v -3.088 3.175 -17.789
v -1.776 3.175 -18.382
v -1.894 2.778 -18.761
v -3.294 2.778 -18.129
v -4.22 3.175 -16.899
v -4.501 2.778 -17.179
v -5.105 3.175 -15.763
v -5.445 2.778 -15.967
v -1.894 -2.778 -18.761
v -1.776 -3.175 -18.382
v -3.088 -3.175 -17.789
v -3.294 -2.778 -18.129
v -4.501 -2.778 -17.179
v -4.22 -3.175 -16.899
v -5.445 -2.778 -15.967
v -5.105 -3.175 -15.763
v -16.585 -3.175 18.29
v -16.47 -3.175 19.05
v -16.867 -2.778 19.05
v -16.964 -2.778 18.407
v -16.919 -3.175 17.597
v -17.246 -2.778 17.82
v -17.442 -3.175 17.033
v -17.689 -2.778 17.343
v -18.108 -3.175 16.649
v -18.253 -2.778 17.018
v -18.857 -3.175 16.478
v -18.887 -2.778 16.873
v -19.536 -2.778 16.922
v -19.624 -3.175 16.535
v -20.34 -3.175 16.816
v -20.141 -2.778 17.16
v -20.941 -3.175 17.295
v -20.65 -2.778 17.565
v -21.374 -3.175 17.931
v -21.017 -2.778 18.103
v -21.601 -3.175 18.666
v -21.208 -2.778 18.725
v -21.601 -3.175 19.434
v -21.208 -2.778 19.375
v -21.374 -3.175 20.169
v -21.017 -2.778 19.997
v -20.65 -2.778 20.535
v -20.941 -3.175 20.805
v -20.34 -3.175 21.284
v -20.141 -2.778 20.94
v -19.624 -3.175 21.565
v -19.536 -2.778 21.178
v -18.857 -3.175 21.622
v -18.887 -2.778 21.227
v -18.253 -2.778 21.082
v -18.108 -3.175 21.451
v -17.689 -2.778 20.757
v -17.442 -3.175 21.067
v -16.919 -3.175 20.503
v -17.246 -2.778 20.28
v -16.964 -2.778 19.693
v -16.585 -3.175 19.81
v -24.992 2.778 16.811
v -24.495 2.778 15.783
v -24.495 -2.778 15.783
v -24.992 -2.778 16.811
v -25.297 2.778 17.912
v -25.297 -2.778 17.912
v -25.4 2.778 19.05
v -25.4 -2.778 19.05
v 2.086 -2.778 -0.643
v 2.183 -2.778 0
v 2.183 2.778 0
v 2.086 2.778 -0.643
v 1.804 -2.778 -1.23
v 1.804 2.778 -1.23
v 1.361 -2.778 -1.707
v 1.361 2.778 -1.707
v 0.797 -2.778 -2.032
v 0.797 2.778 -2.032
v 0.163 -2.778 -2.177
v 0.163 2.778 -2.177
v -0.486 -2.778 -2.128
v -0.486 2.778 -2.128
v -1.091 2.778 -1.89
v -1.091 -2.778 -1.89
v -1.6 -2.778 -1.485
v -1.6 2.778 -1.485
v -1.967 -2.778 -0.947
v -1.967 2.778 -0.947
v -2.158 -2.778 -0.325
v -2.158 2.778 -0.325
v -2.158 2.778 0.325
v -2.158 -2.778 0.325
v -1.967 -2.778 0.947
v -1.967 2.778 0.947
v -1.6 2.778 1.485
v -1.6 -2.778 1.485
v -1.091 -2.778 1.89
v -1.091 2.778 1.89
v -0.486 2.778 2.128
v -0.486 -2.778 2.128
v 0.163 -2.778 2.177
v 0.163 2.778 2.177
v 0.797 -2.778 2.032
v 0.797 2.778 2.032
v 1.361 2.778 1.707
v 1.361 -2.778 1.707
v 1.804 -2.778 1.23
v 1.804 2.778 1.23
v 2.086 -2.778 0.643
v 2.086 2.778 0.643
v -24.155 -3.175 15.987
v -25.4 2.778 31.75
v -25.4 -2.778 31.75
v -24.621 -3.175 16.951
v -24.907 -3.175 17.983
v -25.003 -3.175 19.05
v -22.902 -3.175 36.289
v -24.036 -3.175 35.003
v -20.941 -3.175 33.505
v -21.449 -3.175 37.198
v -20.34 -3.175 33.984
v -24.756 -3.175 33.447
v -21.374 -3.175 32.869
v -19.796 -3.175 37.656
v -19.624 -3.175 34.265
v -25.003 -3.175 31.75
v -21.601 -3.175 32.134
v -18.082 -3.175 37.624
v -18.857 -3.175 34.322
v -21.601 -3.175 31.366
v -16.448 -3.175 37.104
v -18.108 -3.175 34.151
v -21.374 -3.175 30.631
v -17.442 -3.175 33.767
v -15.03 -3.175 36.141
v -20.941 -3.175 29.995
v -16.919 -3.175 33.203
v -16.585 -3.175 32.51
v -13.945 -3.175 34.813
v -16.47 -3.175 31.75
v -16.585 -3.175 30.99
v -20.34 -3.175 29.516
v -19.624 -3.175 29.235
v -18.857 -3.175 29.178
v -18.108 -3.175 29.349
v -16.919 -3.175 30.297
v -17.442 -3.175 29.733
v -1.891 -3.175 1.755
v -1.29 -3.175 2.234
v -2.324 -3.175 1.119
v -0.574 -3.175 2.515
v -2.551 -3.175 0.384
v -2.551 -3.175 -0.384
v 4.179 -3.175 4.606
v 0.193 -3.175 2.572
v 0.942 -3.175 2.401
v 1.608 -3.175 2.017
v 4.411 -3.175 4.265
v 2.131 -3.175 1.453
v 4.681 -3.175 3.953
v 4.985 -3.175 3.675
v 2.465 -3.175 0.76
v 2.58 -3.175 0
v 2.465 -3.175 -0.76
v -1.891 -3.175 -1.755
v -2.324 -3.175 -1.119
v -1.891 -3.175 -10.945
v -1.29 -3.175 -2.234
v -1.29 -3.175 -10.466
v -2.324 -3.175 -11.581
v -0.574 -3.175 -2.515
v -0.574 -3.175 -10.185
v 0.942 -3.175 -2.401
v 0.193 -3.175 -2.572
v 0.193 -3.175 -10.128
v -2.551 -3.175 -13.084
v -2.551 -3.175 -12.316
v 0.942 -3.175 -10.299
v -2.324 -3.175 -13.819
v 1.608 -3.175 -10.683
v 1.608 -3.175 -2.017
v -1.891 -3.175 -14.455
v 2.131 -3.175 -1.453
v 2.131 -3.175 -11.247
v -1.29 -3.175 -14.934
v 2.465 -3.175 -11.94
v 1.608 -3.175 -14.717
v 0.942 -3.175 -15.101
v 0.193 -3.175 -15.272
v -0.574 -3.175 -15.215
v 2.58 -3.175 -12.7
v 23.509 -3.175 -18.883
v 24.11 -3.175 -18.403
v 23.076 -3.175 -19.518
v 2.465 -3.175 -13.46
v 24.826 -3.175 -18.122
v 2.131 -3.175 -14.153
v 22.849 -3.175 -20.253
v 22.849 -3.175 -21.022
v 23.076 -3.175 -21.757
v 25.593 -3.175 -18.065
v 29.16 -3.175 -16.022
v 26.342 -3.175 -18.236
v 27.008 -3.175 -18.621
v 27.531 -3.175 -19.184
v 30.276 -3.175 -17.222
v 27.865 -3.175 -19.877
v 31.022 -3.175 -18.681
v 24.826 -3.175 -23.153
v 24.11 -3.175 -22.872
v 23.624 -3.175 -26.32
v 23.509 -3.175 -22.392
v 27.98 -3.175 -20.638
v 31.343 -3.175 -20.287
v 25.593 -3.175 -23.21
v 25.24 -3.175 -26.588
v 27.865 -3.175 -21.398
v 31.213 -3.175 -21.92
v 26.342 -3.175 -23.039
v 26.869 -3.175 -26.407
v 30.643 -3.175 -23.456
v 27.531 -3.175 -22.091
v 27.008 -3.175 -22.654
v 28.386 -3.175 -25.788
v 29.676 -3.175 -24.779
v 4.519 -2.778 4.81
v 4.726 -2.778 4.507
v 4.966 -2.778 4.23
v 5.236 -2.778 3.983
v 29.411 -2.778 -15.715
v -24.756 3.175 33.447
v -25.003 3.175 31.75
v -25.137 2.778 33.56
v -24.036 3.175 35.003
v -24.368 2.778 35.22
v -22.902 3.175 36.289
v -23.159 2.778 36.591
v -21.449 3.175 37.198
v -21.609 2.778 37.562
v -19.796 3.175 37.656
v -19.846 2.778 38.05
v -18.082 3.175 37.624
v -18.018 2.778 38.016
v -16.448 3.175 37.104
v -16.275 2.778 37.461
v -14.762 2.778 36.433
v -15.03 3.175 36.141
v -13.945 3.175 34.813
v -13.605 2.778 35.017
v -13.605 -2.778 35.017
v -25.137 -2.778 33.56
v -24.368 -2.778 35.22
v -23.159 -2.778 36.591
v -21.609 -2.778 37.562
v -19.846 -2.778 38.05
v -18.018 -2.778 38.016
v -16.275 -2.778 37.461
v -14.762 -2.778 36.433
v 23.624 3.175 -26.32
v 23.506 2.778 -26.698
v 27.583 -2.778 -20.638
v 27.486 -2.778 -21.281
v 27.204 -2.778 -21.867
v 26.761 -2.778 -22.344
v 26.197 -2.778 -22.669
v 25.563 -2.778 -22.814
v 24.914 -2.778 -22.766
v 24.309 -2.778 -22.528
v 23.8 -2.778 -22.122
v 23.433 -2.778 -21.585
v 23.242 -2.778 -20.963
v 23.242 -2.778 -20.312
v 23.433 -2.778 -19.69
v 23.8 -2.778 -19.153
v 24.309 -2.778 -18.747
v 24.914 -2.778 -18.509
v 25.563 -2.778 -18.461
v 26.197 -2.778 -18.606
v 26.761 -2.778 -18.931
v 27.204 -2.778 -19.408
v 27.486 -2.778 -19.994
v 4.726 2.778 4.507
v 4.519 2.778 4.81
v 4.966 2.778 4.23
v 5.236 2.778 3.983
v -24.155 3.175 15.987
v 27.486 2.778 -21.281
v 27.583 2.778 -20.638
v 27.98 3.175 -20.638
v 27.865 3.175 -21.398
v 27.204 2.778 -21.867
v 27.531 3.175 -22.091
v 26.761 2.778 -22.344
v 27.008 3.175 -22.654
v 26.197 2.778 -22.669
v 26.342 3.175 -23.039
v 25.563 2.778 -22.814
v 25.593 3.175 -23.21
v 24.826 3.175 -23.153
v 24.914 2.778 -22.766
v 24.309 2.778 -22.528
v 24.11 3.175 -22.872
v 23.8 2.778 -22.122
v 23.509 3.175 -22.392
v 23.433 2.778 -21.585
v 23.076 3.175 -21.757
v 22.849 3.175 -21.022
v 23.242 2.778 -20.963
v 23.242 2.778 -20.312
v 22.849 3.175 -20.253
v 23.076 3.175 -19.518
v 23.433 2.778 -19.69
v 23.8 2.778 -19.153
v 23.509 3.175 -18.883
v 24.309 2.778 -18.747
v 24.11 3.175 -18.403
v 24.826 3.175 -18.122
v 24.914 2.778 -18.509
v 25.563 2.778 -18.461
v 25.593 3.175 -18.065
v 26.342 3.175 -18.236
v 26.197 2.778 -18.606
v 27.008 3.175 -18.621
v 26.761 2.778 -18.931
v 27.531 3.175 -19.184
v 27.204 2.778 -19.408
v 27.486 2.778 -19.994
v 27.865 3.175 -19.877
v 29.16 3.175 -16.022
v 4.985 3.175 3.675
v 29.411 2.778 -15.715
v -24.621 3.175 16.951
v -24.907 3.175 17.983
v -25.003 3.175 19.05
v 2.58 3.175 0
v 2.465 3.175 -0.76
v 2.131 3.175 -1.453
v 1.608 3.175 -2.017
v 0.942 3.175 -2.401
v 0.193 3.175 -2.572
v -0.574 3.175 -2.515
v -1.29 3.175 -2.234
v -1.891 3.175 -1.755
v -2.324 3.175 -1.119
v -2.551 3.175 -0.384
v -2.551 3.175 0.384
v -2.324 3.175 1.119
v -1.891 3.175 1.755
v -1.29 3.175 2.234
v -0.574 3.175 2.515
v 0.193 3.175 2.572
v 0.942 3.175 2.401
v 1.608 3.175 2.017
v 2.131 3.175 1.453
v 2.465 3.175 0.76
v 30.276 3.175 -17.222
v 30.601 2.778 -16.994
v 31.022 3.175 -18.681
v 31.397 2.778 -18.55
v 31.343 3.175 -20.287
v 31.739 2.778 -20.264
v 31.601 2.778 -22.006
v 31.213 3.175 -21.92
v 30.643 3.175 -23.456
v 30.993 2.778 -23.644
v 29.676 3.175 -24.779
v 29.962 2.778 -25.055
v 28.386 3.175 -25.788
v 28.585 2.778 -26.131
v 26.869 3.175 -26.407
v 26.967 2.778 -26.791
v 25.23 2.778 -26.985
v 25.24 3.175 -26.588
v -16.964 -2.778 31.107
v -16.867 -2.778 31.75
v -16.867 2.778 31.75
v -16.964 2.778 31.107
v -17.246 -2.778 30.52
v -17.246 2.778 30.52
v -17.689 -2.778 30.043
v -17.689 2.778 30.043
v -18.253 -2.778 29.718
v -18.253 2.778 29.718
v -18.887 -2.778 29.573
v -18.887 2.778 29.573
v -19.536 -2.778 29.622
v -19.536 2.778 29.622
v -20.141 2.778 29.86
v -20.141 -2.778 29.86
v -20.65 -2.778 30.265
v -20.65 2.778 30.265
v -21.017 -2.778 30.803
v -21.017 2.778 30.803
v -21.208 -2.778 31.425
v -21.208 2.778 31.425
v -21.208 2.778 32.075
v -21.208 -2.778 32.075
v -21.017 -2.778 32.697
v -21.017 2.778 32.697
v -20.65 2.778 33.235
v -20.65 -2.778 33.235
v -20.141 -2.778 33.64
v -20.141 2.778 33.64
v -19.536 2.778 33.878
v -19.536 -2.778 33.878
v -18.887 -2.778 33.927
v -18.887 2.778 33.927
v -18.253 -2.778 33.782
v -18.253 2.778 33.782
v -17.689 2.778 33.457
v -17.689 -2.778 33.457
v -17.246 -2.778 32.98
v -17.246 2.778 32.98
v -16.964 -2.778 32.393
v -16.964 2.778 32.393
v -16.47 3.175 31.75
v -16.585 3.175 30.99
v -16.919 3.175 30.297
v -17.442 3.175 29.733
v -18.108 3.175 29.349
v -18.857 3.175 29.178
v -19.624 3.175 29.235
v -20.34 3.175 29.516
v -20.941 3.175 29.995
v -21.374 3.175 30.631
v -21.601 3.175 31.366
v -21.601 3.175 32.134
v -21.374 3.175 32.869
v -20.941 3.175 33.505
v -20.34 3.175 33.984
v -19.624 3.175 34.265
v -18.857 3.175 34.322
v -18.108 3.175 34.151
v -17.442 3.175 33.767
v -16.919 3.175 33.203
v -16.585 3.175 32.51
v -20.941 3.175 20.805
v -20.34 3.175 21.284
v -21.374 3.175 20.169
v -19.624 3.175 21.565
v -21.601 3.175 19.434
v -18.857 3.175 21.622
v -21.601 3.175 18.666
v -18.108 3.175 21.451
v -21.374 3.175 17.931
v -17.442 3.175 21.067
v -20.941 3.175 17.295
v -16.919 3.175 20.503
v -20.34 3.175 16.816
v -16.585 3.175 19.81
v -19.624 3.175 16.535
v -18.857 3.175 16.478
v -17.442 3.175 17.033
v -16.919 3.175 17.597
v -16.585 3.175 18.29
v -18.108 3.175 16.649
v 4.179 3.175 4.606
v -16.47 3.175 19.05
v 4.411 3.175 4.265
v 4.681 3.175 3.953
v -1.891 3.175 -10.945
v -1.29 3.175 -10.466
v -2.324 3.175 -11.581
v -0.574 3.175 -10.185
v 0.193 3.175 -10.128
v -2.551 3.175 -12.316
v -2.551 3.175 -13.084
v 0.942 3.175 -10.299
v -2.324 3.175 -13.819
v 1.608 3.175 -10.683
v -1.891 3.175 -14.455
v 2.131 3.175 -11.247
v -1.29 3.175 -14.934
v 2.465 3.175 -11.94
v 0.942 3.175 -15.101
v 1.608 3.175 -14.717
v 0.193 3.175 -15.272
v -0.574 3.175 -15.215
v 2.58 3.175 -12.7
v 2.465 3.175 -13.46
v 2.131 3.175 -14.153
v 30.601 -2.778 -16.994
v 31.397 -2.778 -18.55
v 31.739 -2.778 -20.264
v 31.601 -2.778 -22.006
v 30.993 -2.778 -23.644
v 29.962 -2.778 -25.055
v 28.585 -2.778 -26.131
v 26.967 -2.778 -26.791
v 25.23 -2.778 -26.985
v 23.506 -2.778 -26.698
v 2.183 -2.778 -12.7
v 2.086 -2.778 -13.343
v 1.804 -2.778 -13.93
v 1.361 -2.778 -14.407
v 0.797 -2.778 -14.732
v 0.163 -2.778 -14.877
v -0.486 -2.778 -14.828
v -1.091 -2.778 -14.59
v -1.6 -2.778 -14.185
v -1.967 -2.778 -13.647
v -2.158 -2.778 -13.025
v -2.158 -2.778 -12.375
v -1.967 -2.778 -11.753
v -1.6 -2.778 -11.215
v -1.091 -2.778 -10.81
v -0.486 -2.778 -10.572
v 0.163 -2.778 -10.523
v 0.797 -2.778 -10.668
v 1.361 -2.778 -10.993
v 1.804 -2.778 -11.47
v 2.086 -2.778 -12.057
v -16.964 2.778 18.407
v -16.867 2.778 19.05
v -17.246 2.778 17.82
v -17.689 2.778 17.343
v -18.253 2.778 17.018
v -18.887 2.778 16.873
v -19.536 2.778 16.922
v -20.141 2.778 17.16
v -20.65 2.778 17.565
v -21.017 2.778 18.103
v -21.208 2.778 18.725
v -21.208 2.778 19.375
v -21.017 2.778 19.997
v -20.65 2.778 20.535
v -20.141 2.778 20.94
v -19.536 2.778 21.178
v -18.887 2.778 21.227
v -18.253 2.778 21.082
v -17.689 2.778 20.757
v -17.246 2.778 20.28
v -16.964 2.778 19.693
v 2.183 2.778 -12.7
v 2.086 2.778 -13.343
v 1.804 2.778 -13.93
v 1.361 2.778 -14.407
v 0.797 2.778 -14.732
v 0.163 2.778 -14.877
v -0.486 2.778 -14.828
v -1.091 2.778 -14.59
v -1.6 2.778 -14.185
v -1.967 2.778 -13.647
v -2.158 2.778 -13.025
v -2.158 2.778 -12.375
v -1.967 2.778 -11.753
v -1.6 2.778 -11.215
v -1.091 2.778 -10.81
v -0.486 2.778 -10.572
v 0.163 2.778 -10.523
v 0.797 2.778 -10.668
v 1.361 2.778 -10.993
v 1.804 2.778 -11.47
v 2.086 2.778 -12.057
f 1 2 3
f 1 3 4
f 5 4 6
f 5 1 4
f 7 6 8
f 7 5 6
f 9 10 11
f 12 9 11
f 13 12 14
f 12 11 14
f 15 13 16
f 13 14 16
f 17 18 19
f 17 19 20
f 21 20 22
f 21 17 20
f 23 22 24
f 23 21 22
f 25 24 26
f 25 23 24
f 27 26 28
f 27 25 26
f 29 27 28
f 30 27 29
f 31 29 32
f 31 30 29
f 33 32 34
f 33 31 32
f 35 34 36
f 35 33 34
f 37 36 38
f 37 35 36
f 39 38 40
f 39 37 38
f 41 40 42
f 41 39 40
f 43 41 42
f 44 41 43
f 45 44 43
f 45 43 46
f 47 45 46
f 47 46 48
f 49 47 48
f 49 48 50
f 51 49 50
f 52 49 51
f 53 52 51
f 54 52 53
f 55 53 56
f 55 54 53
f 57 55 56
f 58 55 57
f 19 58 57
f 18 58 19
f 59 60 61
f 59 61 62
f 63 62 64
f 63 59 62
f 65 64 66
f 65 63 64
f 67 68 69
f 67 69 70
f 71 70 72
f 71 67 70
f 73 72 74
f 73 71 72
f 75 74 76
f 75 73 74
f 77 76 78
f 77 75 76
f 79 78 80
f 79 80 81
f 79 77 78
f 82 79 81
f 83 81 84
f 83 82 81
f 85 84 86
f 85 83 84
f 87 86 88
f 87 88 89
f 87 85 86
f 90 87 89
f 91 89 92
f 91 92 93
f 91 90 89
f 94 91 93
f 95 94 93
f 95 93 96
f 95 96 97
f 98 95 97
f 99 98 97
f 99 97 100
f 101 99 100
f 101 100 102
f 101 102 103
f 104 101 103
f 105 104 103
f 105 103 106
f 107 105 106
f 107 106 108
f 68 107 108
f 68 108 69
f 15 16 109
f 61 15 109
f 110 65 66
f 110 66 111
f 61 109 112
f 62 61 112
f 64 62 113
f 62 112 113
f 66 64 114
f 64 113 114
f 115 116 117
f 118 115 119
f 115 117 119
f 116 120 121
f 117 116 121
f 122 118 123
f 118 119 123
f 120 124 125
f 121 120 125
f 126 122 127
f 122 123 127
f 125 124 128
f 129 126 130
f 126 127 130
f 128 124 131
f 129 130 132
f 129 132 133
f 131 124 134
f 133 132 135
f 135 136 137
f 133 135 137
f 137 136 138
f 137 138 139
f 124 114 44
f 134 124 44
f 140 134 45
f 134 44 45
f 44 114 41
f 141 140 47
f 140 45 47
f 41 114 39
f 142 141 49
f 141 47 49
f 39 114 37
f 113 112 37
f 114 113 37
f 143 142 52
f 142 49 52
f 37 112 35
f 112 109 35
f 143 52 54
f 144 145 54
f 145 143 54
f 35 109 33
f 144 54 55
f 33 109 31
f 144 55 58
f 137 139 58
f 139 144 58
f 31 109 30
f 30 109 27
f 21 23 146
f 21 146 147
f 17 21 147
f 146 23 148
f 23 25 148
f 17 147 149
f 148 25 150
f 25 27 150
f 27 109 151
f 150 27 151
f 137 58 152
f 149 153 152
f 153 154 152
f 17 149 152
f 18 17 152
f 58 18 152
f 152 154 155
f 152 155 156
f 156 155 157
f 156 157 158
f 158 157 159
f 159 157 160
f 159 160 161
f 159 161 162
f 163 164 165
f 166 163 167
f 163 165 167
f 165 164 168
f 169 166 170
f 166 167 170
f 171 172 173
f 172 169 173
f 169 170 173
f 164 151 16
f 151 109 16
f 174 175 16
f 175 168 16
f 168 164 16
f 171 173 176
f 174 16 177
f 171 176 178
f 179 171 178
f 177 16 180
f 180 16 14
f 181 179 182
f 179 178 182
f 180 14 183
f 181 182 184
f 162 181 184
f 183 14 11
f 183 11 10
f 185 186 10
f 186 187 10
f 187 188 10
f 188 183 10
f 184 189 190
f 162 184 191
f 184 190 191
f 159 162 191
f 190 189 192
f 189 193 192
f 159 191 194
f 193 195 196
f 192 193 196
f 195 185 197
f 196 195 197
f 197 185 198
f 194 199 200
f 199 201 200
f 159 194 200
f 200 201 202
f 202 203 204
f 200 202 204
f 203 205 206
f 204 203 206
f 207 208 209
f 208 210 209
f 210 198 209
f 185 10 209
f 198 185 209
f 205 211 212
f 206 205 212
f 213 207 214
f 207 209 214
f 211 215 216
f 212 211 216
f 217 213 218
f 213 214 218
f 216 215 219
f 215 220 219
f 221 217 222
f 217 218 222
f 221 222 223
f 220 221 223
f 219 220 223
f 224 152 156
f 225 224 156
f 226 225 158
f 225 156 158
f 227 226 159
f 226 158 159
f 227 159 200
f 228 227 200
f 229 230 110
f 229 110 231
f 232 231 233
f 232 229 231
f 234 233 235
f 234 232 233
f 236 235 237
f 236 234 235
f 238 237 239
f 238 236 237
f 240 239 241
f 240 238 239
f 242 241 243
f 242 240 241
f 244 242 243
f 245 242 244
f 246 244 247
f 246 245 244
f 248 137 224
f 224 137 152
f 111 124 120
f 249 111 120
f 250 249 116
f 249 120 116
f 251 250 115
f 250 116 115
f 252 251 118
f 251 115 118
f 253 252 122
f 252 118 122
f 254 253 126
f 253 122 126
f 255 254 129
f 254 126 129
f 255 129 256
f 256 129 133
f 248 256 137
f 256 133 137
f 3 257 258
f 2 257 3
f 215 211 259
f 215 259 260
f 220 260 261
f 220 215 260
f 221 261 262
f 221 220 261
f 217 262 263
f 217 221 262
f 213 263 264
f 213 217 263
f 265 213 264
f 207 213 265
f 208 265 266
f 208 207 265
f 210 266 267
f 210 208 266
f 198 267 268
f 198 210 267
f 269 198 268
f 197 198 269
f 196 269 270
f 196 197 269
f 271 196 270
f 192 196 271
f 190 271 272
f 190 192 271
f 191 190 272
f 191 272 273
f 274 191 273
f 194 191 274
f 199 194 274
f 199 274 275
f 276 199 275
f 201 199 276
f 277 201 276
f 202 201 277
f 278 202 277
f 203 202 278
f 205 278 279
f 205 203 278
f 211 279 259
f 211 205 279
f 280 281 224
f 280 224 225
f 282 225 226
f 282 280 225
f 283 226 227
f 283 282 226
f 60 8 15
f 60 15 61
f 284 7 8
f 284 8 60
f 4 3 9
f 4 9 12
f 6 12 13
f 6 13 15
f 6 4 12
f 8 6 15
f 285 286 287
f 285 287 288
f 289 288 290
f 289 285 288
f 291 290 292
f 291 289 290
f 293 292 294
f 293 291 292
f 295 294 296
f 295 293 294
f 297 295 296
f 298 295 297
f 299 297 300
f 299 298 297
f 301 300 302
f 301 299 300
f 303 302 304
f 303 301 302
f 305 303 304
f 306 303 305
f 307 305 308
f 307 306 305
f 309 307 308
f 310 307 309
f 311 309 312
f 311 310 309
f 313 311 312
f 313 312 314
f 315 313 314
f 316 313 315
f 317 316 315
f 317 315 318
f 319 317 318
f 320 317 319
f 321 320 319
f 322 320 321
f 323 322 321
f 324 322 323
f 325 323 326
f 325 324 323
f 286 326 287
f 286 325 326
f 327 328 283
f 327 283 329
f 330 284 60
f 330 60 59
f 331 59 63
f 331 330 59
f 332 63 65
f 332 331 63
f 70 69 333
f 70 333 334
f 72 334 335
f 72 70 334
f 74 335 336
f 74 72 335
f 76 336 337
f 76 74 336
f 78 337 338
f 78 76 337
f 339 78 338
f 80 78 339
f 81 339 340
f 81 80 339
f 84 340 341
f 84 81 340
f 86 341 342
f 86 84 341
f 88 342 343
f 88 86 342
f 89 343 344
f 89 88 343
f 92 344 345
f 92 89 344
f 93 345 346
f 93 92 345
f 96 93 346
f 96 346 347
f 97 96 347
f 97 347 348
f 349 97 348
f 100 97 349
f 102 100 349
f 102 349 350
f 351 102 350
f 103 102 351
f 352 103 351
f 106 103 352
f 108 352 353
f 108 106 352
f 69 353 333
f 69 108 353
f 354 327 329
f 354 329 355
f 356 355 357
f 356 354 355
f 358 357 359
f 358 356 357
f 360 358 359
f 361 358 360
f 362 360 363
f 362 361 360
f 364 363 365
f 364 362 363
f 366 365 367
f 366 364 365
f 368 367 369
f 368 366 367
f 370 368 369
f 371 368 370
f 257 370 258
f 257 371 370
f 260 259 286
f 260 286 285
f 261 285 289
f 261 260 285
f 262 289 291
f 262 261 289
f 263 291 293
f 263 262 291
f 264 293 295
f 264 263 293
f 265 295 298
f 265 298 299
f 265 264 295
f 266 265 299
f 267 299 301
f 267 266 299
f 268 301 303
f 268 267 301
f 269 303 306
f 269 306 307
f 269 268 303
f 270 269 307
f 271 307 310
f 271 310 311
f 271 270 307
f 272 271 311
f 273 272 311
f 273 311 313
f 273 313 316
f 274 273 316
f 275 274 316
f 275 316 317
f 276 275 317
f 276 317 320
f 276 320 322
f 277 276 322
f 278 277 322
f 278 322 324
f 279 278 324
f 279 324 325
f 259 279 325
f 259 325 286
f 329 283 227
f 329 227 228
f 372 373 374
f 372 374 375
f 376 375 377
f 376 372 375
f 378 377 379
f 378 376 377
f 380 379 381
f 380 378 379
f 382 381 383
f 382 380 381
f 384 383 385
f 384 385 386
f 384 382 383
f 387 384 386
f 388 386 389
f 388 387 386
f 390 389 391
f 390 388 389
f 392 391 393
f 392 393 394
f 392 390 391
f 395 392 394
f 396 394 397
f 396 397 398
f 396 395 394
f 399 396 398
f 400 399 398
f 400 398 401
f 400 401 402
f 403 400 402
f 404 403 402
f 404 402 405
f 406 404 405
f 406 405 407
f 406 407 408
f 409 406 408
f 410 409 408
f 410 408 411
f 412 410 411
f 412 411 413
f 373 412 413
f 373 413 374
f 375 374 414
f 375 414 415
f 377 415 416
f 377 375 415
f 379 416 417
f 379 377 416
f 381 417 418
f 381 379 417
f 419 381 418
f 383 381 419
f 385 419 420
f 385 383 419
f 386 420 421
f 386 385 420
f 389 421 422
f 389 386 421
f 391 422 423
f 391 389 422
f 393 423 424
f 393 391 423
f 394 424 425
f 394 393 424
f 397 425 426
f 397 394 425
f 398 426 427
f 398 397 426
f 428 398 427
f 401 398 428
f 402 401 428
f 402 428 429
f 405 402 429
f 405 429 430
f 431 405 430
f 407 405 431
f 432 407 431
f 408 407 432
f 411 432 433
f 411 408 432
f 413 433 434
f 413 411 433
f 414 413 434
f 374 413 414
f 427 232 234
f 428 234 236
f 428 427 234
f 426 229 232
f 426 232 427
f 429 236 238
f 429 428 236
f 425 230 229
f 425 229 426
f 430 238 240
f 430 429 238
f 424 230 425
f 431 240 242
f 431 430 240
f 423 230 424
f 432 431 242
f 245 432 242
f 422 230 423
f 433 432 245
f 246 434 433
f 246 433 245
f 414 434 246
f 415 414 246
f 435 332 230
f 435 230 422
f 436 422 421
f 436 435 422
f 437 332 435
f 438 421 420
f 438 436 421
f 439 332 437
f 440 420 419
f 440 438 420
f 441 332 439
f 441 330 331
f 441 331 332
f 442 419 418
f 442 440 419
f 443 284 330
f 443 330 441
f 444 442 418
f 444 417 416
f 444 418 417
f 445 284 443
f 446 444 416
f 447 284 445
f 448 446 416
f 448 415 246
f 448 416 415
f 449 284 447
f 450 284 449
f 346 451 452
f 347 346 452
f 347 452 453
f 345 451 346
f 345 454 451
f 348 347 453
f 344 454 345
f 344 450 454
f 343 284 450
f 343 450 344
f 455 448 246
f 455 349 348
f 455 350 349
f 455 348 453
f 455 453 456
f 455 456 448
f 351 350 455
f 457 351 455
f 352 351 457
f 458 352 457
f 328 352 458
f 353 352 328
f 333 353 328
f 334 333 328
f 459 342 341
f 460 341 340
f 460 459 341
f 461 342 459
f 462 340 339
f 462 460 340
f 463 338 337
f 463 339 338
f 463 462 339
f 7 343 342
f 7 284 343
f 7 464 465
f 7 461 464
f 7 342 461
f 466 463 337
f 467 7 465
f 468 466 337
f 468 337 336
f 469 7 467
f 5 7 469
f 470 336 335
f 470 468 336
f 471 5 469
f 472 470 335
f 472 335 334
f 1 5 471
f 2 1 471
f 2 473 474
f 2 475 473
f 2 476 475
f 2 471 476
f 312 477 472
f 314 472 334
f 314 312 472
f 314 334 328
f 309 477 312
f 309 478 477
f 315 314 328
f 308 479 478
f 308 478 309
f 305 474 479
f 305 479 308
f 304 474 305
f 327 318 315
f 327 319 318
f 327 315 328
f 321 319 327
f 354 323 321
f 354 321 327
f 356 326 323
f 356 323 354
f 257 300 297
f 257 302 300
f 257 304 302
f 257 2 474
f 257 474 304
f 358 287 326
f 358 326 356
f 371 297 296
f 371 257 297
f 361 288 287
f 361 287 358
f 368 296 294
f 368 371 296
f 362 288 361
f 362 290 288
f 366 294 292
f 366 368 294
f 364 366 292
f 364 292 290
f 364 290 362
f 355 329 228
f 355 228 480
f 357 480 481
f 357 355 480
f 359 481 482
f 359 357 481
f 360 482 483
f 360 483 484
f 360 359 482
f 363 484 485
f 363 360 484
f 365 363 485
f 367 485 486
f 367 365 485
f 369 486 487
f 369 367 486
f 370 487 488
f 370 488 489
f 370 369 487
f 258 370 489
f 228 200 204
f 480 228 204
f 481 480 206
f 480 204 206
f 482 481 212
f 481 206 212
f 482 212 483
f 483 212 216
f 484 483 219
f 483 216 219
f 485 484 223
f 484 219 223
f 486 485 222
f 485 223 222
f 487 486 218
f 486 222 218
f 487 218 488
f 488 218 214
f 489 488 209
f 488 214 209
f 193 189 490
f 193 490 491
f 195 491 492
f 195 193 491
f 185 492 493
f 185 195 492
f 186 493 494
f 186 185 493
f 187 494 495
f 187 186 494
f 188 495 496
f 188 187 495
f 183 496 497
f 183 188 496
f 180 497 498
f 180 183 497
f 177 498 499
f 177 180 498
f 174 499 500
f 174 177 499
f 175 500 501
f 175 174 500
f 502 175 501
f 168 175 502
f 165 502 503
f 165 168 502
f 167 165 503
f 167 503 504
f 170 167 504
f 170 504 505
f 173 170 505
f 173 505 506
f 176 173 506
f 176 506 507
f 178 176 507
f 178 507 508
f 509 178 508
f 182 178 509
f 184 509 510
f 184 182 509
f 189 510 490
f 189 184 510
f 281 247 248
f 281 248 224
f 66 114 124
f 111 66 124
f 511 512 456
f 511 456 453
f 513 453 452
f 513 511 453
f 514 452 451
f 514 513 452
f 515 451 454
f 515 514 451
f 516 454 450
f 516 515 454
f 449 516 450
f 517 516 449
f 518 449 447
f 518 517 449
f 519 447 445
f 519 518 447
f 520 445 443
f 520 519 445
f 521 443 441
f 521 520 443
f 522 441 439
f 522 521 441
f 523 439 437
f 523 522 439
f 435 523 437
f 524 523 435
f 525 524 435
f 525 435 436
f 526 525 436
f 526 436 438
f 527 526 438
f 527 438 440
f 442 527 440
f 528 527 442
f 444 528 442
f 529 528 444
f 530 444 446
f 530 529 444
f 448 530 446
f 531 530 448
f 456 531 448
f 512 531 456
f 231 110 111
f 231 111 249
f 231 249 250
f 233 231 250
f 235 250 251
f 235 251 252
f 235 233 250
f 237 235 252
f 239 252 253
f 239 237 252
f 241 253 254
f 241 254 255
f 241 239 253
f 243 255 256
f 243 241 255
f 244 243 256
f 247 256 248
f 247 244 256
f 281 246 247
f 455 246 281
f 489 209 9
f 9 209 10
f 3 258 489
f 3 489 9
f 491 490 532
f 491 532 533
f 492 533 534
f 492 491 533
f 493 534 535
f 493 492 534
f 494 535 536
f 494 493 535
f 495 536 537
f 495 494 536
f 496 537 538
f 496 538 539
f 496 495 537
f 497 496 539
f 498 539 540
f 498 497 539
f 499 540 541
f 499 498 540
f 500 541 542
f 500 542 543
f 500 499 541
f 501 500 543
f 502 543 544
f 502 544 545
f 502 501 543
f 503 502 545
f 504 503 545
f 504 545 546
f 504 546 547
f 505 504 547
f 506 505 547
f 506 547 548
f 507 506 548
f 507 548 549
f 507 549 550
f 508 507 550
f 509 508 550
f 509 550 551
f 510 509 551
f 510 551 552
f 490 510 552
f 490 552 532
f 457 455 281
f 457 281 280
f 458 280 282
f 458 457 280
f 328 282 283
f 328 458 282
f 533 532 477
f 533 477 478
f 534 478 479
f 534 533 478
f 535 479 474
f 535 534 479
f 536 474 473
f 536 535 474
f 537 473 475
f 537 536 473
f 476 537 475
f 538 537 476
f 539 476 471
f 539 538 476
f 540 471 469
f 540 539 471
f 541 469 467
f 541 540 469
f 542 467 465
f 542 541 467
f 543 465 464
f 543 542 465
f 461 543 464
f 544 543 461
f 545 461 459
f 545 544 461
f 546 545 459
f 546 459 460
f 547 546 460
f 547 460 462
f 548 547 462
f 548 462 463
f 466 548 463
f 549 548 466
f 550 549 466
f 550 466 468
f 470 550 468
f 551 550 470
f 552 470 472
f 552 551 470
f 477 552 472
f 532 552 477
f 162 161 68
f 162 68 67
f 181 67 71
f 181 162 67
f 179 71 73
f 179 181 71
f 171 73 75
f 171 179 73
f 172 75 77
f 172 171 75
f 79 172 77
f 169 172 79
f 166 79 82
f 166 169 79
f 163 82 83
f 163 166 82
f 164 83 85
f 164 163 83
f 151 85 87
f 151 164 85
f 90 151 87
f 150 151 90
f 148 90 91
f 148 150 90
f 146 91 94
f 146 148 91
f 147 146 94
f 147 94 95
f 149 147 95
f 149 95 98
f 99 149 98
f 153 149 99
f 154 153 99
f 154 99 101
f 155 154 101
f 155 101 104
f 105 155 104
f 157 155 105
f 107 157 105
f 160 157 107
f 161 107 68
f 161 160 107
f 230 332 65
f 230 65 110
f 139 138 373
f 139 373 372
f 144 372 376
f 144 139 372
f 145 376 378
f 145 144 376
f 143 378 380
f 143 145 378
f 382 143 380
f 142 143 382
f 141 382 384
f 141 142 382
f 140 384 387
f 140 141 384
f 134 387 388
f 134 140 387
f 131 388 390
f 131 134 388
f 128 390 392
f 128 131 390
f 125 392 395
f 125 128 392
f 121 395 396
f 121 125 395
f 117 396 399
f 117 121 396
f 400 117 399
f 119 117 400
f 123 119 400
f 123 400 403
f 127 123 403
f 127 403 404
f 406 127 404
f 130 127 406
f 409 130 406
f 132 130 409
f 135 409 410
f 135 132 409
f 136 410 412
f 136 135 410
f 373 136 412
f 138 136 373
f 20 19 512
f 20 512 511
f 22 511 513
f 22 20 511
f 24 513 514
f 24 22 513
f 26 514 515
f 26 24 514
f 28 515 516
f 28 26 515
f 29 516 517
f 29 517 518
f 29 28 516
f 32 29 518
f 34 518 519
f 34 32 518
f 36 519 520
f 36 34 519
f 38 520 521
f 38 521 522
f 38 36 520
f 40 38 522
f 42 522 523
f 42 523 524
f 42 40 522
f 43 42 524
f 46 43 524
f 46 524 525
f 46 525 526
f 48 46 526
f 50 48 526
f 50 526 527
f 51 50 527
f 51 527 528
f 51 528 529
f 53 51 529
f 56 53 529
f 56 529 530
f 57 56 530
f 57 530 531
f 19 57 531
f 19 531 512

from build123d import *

# Parameters (mm, degrees)
SKETCH1_R           = 2.1828125
BOSS_EXTRUDE1_DEPTH = 3.175
CHAMFER1_SIZE       = 0.396875


with BuildPart() as part:
    # Sketch1 → Boss-Extrude1 (new body, symmetric)
    with BuildSketch(Plane(origin=(0, 0, 0), x_dir=(1, 0, 0), z_dir=(0, 1, 0))):
        with BuildLine():
            Line((-25.4, -19.05), (-25.4, -31.75))
            ThreePointArc((-25.4, -31.75), (-20.745028245, -37.869589794), (-13.604919922, -35.017048047))
            Line((-13.604919922, -35.017048047), (4.519073196, -4.810392851))
            ThreePointArc((4.519073196, -4.810392851), (4.841622185, -4.365295225), (5.236106863, -3.98250078))
            Line((5.236106863, -3.98250078), (29.411012744, 15.71466781))
            ThreePointArc((29.411012744, 15.71466781), (30.992963694, 23.644368325), (23.505953794, 26.698447861))
            Line((23.505953794, 26.698447861), (-1.894046206, 18.760947861))
            ThreePointArc((-1.894046206, 18.760947861), (-3.926469495, 17.690524752), (-5.445080078, 15.967048047))
            Line((-5.445080078, 15.967048047), (-24.495080078, -15.782951953))
            ThreePointArc((-24.495080078, -15.782951953), (-25.169589794, -17.354971755), (-25.4, -19.05))
        make_face()
        Circle(SKETCH1_R, mode=Mode.SUBTRACT)
        with Locations((0, 12.7)):
            Circle(SKETCH1_R, mode=Mode.SUBTRACT)
        with Locations((-19.05, -19.05)):
            Circle(SKETCH1_R, mode=Mode.SUBTRACT)
        with Locations((-19.05, -31.75)):
            Circle(SKETCH1_R, mode=Mode.SUBTRACT)
        with Locations((25.4, 20.6375)):
            Circle(SKETCH1_R, mode=Mode.SUBTRACT)
    extrude(amount=BOSS_EXTRUDE1_DEPTH, both=True)

    # Chamfer1
    chamfer1_edges = [part.edges().sort_by_distance(p)[0] for p in [
        (-4.542923363, -3.175, 19.913720449),
        (-20.745028245, -3.175, 37.869589794),
        (-25.4, -3.175, 25.4),
        (-25.169589794, -3.175, 17.354971755),
        (-14.970080078, -3.175, -0.092048047),
        (-3.926469495, -3.175, -17.690524752),
        (10.805953794, -3.175, -22.729697861),
        (30.992963694, 3.175, -23.644368325),
        (30.992963694, -3.175, -23.644368325),
        (17.323559803, -3.175, -5.866083515),
        (4.841622185, -3.175, 4.365295225),
        (10.805953794, 3.175, -22.729697861),
        (-3.926469495, 3.175, -17.690524752),
        (-14.970080078, 3.175, -0.092048047),
        (-2.1828125, -3.175, 0),
        (-2.1828125, 3.175, 0),
        (-25.169589794, 3.175, 17.354971755),
        (-2.1828125, -3.175, -12.7),
        (-2.1828125, 3.175, -12.7),
        (-25.4, 3.175, 25.4),
        (-21.2328125, -3.175, 19.05),
        (-21.2328125, 3.175, 19.05),
        (-20.745028245, 3.175, 37.869589794),
        (-21.2328125, -3.175, 31.75),
        (-21.2328125, 3.175, 31.75),
        (-4.542923363, 3.175, 19.913720449),
        (23.2171875, -3.175, -20.6375),
        (23.2171875, 3.175, -20.6375),
        (4.841622185, 3.175, 4.365295225),
        (17.323559803, 3.175, -5.866083515),
    ]]
    chamfer(chamfer1_edges, length=CHAMFER1_SIZE)


solid = part.part
